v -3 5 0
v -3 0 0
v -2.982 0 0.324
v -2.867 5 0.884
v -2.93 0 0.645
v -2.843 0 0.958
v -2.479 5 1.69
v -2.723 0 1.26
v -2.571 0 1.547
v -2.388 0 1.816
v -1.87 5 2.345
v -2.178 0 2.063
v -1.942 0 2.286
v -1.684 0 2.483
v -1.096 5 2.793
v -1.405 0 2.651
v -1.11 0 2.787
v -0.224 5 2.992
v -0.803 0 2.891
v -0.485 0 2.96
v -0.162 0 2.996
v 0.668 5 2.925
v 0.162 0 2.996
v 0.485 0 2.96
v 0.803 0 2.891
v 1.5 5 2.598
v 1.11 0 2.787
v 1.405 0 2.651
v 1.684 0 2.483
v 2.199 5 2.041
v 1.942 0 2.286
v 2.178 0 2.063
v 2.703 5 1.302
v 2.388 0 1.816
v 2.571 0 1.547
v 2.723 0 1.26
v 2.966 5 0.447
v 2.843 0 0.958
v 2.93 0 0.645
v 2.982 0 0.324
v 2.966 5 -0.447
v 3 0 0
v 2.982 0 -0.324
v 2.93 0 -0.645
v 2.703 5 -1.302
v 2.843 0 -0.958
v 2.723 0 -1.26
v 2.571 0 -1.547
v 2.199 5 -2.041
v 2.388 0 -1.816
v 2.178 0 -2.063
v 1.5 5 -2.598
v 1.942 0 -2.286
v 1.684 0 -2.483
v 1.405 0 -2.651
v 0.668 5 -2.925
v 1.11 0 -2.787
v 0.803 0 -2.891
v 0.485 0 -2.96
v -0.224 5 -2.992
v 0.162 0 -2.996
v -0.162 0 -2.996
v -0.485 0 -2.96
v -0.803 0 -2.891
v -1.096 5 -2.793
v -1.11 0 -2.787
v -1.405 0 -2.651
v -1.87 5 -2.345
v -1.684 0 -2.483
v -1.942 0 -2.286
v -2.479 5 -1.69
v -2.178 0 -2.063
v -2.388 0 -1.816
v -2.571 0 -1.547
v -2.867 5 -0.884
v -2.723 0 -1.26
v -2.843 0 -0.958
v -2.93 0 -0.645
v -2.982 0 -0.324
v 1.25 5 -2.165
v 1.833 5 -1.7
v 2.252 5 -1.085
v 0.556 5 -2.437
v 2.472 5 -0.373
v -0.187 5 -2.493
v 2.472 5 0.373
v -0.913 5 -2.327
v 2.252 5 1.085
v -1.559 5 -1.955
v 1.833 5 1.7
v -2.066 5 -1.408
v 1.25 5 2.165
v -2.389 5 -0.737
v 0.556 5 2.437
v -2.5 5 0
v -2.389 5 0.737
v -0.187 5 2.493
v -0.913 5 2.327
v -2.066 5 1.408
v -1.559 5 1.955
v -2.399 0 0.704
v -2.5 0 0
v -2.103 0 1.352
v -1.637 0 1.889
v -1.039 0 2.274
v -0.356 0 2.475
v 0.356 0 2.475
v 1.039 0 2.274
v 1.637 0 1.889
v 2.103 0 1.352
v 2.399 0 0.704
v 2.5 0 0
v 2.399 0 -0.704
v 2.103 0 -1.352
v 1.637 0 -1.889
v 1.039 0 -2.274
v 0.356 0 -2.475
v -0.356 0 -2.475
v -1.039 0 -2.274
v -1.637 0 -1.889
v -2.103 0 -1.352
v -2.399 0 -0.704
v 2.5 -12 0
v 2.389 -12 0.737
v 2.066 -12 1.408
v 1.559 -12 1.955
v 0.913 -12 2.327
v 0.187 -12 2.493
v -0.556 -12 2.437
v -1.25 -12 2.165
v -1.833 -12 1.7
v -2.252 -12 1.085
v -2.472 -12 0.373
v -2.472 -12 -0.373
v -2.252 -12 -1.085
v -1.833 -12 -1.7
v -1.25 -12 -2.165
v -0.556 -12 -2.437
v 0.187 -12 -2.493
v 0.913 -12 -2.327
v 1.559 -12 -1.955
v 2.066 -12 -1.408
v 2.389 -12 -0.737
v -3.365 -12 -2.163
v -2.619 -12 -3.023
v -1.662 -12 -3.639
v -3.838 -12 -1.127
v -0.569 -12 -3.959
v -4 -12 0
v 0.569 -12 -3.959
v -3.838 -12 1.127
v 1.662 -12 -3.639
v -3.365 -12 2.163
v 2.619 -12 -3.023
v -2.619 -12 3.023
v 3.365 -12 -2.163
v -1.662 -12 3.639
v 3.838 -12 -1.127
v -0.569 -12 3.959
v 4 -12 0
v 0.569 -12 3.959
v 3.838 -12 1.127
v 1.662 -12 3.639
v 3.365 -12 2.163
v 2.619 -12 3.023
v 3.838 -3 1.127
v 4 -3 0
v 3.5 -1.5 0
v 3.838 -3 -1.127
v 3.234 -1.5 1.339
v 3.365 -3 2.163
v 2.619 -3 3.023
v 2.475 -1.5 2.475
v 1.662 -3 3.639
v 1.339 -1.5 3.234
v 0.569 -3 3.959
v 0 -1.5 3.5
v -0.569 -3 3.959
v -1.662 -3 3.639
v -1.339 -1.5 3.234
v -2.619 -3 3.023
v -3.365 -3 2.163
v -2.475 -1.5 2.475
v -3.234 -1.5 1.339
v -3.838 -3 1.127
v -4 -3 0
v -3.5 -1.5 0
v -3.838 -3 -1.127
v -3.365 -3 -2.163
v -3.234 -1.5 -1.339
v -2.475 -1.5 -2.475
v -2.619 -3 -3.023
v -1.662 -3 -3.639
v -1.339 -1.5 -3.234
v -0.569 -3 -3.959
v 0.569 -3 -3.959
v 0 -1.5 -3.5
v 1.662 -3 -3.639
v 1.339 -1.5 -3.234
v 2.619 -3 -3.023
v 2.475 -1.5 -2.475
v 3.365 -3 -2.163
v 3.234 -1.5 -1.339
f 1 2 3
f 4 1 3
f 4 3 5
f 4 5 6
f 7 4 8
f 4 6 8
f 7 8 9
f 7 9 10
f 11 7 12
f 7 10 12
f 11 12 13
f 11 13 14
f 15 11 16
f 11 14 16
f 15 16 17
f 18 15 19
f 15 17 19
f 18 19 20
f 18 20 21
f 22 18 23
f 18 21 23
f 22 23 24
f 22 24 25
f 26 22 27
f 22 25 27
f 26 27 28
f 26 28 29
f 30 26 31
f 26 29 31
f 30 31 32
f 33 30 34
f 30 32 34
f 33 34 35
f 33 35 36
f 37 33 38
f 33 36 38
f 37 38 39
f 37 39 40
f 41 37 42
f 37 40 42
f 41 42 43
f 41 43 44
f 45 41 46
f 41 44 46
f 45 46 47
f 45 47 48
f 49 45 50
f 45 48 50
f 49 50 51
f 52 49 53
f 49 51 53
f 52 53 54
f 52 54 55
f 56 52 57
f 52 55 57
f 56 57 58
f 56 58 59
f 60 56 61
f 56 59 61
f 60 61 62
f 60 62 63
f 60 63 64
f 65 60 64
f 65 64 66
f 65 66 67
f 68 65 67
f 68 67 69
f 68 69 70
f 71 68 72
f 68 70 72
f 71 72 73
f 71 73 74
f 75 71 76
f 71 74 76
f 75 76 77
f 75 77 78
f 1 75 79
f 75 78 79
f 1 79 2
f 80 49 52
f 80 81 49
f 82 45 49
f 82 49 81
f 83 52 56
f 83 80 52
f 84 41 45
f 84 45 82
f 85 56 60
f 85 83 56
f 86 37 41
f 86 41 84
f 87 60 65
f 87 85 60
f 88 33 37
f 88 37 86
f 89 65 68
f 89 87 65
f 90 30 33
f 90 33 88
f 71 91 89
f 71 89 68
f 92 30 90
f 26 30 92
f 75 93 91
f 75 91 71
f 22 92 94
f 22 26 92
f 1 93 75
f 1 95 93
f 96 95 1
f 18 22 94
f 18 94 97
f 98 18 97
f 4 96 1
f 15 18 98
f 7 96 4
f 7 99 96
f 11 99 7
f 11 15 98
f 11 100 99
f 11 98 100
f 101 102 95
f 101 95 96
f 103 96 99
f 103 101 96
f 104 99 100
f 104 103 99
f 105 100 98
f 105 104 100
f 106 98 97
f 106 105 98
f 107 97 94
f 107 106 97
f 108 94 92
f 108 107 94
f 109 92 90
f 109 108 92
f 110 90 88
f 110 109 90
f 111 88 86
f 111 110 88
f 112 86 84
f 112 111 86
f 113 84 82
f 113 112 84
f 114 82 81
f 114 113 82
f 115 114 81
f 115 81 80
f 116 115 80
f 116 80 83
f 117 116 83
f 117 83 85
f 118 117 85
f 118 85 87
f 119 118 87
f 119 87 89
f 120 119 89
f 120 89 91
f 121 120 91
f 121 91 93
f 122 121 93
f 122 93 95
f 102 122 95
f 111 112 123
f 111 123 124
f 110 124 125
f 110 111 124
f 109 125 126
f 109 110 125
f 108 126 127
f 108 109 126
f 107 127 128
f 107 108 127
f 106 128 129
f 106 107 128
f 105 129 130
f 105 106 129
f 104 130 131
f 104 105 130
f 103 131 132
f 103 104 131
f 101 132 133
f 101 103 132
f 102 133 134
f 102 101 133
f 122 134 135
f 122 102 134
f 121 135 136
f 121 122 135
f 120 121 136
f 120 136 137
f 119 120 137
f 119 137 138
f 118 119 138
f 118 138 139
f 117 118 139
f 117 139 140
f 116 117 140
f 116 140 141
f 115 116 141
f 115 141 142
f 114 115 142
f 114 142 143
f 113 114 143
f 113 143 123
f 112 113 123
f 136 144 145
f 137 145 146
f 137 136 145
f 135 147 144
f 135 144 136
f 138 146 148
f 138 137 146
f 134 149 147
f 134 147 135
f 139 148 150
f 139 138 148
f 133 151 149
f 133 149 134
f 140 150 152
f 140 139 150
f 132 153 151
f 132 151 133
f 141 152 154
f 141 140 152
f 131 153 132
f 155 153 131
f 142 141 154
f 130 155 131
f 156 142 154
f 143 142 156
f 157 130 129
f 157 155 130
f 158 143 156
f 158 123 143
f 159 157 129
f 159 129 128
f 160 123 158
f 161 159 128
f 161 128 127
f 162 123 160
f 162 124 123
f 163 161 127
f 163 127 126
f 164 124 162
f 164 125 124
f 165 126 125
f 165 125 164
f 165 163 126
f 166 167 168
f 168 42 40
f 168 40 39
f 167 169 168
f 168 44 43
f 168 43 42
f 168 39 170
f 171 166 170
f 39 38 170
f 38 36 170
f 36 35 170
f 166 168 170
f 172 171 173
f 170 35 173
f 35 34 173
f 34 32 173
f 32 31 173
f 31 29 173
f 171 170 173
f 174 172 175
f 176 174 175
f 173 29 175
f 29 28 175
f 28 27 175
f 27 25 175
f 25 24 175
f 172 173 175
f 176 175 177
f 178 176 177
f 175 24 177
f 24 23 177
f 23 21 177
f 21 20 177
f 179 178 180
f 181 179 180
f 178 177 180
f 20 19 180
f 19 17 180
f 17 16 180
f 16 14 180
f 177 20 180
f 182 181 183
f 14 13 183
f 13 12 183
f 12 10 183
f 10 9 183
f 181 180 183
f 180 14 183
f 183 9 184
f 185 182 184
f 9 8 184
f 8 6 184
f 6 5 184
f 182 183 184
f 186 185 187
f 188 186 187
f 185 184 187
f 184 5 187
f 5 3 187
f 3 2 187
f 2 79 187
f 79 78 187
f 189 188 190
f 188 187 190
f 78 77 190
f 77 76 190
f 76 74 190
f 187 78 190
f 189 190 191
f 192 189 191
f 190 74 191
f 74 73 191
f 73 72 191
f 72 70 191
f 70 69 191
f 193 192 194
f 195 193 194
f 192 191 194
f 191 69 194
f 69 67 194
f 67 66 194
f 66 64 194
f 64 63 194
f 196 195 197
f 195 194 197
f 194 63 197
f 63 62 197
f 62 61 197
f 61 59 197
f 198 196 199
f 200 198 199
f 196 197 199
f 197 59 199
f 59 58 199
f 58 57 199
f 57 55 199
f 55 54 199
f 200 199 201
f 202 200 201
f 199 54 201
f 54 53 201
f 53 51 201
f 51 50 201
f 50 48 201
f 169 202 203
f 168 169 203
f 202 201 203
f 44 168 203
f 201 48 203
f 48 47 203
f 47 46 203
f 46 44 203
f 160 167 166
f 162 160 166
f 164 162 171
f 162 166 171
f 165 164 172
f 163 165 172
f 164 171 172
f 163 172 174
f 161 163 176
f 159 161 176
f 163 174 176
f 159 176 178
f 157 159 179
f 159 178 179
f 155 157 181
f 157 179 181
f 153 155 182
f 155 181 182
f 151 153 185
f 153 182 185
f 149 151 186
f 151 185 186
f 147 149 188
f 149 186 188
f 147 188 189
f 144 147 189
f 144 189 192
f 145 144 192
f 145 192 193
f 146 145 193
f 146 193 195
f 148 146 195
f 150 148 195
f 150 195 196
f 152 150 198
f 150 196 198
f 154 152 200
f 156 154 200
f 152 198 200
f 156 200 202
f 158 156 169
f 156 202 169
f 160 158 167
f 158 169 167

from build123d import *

# Parameters (mm, degrees)
F0_R     = 4
F0_R_2   = 2.5
F1_DEPTH = 12
F2_R     = 3
F2_R_2   = 2.5
F3_DEPTH = 5
F4_SIZE2 = 0.99999
F4_SIZE  = 2.99999


# Not quite as in the source:
# - a fillet or chamfer is up to 0.001 mm smaller than in the source, because OpenCascade refuses the exact size


with BuildPart() as f1:
    # F0 (on Front) → F1 (new body)
    with BuildSketch(Plane.XZ):
        Circle(F0_R)
        Circle(F0_R_2, mode=Mode.SUBTRACT)
    extrude(amount=F1_DEPTH)

    # F2 (on face) → F3 (join)
    with BuildSketch(Plane(origin=(0, 0, 0), x_dir=(-1, 0, 0), z_dir=(0, 1, 0))):
        Circle(F2_R)
        Circle(F2_R_2, mode=Mode.SUBTRACT)
    extrude(amount=F3_DEPTH)

    # F4 (size 3 and 1 in the source; OpenCascade refuses exactly that, so slightly less here)
    f4_edges = [f1.edges().sort_by_distance(p)[0] for p in [
        (-4, 0, 0),
    ]]
    f4_side = f1.faces().sort_by_distance((-4, -6, 0))[0]
    chamfer(f4_edges, length=F4_SIZE, length2=F4_SIZE2, reference=f4_side)


solid = f1.part
